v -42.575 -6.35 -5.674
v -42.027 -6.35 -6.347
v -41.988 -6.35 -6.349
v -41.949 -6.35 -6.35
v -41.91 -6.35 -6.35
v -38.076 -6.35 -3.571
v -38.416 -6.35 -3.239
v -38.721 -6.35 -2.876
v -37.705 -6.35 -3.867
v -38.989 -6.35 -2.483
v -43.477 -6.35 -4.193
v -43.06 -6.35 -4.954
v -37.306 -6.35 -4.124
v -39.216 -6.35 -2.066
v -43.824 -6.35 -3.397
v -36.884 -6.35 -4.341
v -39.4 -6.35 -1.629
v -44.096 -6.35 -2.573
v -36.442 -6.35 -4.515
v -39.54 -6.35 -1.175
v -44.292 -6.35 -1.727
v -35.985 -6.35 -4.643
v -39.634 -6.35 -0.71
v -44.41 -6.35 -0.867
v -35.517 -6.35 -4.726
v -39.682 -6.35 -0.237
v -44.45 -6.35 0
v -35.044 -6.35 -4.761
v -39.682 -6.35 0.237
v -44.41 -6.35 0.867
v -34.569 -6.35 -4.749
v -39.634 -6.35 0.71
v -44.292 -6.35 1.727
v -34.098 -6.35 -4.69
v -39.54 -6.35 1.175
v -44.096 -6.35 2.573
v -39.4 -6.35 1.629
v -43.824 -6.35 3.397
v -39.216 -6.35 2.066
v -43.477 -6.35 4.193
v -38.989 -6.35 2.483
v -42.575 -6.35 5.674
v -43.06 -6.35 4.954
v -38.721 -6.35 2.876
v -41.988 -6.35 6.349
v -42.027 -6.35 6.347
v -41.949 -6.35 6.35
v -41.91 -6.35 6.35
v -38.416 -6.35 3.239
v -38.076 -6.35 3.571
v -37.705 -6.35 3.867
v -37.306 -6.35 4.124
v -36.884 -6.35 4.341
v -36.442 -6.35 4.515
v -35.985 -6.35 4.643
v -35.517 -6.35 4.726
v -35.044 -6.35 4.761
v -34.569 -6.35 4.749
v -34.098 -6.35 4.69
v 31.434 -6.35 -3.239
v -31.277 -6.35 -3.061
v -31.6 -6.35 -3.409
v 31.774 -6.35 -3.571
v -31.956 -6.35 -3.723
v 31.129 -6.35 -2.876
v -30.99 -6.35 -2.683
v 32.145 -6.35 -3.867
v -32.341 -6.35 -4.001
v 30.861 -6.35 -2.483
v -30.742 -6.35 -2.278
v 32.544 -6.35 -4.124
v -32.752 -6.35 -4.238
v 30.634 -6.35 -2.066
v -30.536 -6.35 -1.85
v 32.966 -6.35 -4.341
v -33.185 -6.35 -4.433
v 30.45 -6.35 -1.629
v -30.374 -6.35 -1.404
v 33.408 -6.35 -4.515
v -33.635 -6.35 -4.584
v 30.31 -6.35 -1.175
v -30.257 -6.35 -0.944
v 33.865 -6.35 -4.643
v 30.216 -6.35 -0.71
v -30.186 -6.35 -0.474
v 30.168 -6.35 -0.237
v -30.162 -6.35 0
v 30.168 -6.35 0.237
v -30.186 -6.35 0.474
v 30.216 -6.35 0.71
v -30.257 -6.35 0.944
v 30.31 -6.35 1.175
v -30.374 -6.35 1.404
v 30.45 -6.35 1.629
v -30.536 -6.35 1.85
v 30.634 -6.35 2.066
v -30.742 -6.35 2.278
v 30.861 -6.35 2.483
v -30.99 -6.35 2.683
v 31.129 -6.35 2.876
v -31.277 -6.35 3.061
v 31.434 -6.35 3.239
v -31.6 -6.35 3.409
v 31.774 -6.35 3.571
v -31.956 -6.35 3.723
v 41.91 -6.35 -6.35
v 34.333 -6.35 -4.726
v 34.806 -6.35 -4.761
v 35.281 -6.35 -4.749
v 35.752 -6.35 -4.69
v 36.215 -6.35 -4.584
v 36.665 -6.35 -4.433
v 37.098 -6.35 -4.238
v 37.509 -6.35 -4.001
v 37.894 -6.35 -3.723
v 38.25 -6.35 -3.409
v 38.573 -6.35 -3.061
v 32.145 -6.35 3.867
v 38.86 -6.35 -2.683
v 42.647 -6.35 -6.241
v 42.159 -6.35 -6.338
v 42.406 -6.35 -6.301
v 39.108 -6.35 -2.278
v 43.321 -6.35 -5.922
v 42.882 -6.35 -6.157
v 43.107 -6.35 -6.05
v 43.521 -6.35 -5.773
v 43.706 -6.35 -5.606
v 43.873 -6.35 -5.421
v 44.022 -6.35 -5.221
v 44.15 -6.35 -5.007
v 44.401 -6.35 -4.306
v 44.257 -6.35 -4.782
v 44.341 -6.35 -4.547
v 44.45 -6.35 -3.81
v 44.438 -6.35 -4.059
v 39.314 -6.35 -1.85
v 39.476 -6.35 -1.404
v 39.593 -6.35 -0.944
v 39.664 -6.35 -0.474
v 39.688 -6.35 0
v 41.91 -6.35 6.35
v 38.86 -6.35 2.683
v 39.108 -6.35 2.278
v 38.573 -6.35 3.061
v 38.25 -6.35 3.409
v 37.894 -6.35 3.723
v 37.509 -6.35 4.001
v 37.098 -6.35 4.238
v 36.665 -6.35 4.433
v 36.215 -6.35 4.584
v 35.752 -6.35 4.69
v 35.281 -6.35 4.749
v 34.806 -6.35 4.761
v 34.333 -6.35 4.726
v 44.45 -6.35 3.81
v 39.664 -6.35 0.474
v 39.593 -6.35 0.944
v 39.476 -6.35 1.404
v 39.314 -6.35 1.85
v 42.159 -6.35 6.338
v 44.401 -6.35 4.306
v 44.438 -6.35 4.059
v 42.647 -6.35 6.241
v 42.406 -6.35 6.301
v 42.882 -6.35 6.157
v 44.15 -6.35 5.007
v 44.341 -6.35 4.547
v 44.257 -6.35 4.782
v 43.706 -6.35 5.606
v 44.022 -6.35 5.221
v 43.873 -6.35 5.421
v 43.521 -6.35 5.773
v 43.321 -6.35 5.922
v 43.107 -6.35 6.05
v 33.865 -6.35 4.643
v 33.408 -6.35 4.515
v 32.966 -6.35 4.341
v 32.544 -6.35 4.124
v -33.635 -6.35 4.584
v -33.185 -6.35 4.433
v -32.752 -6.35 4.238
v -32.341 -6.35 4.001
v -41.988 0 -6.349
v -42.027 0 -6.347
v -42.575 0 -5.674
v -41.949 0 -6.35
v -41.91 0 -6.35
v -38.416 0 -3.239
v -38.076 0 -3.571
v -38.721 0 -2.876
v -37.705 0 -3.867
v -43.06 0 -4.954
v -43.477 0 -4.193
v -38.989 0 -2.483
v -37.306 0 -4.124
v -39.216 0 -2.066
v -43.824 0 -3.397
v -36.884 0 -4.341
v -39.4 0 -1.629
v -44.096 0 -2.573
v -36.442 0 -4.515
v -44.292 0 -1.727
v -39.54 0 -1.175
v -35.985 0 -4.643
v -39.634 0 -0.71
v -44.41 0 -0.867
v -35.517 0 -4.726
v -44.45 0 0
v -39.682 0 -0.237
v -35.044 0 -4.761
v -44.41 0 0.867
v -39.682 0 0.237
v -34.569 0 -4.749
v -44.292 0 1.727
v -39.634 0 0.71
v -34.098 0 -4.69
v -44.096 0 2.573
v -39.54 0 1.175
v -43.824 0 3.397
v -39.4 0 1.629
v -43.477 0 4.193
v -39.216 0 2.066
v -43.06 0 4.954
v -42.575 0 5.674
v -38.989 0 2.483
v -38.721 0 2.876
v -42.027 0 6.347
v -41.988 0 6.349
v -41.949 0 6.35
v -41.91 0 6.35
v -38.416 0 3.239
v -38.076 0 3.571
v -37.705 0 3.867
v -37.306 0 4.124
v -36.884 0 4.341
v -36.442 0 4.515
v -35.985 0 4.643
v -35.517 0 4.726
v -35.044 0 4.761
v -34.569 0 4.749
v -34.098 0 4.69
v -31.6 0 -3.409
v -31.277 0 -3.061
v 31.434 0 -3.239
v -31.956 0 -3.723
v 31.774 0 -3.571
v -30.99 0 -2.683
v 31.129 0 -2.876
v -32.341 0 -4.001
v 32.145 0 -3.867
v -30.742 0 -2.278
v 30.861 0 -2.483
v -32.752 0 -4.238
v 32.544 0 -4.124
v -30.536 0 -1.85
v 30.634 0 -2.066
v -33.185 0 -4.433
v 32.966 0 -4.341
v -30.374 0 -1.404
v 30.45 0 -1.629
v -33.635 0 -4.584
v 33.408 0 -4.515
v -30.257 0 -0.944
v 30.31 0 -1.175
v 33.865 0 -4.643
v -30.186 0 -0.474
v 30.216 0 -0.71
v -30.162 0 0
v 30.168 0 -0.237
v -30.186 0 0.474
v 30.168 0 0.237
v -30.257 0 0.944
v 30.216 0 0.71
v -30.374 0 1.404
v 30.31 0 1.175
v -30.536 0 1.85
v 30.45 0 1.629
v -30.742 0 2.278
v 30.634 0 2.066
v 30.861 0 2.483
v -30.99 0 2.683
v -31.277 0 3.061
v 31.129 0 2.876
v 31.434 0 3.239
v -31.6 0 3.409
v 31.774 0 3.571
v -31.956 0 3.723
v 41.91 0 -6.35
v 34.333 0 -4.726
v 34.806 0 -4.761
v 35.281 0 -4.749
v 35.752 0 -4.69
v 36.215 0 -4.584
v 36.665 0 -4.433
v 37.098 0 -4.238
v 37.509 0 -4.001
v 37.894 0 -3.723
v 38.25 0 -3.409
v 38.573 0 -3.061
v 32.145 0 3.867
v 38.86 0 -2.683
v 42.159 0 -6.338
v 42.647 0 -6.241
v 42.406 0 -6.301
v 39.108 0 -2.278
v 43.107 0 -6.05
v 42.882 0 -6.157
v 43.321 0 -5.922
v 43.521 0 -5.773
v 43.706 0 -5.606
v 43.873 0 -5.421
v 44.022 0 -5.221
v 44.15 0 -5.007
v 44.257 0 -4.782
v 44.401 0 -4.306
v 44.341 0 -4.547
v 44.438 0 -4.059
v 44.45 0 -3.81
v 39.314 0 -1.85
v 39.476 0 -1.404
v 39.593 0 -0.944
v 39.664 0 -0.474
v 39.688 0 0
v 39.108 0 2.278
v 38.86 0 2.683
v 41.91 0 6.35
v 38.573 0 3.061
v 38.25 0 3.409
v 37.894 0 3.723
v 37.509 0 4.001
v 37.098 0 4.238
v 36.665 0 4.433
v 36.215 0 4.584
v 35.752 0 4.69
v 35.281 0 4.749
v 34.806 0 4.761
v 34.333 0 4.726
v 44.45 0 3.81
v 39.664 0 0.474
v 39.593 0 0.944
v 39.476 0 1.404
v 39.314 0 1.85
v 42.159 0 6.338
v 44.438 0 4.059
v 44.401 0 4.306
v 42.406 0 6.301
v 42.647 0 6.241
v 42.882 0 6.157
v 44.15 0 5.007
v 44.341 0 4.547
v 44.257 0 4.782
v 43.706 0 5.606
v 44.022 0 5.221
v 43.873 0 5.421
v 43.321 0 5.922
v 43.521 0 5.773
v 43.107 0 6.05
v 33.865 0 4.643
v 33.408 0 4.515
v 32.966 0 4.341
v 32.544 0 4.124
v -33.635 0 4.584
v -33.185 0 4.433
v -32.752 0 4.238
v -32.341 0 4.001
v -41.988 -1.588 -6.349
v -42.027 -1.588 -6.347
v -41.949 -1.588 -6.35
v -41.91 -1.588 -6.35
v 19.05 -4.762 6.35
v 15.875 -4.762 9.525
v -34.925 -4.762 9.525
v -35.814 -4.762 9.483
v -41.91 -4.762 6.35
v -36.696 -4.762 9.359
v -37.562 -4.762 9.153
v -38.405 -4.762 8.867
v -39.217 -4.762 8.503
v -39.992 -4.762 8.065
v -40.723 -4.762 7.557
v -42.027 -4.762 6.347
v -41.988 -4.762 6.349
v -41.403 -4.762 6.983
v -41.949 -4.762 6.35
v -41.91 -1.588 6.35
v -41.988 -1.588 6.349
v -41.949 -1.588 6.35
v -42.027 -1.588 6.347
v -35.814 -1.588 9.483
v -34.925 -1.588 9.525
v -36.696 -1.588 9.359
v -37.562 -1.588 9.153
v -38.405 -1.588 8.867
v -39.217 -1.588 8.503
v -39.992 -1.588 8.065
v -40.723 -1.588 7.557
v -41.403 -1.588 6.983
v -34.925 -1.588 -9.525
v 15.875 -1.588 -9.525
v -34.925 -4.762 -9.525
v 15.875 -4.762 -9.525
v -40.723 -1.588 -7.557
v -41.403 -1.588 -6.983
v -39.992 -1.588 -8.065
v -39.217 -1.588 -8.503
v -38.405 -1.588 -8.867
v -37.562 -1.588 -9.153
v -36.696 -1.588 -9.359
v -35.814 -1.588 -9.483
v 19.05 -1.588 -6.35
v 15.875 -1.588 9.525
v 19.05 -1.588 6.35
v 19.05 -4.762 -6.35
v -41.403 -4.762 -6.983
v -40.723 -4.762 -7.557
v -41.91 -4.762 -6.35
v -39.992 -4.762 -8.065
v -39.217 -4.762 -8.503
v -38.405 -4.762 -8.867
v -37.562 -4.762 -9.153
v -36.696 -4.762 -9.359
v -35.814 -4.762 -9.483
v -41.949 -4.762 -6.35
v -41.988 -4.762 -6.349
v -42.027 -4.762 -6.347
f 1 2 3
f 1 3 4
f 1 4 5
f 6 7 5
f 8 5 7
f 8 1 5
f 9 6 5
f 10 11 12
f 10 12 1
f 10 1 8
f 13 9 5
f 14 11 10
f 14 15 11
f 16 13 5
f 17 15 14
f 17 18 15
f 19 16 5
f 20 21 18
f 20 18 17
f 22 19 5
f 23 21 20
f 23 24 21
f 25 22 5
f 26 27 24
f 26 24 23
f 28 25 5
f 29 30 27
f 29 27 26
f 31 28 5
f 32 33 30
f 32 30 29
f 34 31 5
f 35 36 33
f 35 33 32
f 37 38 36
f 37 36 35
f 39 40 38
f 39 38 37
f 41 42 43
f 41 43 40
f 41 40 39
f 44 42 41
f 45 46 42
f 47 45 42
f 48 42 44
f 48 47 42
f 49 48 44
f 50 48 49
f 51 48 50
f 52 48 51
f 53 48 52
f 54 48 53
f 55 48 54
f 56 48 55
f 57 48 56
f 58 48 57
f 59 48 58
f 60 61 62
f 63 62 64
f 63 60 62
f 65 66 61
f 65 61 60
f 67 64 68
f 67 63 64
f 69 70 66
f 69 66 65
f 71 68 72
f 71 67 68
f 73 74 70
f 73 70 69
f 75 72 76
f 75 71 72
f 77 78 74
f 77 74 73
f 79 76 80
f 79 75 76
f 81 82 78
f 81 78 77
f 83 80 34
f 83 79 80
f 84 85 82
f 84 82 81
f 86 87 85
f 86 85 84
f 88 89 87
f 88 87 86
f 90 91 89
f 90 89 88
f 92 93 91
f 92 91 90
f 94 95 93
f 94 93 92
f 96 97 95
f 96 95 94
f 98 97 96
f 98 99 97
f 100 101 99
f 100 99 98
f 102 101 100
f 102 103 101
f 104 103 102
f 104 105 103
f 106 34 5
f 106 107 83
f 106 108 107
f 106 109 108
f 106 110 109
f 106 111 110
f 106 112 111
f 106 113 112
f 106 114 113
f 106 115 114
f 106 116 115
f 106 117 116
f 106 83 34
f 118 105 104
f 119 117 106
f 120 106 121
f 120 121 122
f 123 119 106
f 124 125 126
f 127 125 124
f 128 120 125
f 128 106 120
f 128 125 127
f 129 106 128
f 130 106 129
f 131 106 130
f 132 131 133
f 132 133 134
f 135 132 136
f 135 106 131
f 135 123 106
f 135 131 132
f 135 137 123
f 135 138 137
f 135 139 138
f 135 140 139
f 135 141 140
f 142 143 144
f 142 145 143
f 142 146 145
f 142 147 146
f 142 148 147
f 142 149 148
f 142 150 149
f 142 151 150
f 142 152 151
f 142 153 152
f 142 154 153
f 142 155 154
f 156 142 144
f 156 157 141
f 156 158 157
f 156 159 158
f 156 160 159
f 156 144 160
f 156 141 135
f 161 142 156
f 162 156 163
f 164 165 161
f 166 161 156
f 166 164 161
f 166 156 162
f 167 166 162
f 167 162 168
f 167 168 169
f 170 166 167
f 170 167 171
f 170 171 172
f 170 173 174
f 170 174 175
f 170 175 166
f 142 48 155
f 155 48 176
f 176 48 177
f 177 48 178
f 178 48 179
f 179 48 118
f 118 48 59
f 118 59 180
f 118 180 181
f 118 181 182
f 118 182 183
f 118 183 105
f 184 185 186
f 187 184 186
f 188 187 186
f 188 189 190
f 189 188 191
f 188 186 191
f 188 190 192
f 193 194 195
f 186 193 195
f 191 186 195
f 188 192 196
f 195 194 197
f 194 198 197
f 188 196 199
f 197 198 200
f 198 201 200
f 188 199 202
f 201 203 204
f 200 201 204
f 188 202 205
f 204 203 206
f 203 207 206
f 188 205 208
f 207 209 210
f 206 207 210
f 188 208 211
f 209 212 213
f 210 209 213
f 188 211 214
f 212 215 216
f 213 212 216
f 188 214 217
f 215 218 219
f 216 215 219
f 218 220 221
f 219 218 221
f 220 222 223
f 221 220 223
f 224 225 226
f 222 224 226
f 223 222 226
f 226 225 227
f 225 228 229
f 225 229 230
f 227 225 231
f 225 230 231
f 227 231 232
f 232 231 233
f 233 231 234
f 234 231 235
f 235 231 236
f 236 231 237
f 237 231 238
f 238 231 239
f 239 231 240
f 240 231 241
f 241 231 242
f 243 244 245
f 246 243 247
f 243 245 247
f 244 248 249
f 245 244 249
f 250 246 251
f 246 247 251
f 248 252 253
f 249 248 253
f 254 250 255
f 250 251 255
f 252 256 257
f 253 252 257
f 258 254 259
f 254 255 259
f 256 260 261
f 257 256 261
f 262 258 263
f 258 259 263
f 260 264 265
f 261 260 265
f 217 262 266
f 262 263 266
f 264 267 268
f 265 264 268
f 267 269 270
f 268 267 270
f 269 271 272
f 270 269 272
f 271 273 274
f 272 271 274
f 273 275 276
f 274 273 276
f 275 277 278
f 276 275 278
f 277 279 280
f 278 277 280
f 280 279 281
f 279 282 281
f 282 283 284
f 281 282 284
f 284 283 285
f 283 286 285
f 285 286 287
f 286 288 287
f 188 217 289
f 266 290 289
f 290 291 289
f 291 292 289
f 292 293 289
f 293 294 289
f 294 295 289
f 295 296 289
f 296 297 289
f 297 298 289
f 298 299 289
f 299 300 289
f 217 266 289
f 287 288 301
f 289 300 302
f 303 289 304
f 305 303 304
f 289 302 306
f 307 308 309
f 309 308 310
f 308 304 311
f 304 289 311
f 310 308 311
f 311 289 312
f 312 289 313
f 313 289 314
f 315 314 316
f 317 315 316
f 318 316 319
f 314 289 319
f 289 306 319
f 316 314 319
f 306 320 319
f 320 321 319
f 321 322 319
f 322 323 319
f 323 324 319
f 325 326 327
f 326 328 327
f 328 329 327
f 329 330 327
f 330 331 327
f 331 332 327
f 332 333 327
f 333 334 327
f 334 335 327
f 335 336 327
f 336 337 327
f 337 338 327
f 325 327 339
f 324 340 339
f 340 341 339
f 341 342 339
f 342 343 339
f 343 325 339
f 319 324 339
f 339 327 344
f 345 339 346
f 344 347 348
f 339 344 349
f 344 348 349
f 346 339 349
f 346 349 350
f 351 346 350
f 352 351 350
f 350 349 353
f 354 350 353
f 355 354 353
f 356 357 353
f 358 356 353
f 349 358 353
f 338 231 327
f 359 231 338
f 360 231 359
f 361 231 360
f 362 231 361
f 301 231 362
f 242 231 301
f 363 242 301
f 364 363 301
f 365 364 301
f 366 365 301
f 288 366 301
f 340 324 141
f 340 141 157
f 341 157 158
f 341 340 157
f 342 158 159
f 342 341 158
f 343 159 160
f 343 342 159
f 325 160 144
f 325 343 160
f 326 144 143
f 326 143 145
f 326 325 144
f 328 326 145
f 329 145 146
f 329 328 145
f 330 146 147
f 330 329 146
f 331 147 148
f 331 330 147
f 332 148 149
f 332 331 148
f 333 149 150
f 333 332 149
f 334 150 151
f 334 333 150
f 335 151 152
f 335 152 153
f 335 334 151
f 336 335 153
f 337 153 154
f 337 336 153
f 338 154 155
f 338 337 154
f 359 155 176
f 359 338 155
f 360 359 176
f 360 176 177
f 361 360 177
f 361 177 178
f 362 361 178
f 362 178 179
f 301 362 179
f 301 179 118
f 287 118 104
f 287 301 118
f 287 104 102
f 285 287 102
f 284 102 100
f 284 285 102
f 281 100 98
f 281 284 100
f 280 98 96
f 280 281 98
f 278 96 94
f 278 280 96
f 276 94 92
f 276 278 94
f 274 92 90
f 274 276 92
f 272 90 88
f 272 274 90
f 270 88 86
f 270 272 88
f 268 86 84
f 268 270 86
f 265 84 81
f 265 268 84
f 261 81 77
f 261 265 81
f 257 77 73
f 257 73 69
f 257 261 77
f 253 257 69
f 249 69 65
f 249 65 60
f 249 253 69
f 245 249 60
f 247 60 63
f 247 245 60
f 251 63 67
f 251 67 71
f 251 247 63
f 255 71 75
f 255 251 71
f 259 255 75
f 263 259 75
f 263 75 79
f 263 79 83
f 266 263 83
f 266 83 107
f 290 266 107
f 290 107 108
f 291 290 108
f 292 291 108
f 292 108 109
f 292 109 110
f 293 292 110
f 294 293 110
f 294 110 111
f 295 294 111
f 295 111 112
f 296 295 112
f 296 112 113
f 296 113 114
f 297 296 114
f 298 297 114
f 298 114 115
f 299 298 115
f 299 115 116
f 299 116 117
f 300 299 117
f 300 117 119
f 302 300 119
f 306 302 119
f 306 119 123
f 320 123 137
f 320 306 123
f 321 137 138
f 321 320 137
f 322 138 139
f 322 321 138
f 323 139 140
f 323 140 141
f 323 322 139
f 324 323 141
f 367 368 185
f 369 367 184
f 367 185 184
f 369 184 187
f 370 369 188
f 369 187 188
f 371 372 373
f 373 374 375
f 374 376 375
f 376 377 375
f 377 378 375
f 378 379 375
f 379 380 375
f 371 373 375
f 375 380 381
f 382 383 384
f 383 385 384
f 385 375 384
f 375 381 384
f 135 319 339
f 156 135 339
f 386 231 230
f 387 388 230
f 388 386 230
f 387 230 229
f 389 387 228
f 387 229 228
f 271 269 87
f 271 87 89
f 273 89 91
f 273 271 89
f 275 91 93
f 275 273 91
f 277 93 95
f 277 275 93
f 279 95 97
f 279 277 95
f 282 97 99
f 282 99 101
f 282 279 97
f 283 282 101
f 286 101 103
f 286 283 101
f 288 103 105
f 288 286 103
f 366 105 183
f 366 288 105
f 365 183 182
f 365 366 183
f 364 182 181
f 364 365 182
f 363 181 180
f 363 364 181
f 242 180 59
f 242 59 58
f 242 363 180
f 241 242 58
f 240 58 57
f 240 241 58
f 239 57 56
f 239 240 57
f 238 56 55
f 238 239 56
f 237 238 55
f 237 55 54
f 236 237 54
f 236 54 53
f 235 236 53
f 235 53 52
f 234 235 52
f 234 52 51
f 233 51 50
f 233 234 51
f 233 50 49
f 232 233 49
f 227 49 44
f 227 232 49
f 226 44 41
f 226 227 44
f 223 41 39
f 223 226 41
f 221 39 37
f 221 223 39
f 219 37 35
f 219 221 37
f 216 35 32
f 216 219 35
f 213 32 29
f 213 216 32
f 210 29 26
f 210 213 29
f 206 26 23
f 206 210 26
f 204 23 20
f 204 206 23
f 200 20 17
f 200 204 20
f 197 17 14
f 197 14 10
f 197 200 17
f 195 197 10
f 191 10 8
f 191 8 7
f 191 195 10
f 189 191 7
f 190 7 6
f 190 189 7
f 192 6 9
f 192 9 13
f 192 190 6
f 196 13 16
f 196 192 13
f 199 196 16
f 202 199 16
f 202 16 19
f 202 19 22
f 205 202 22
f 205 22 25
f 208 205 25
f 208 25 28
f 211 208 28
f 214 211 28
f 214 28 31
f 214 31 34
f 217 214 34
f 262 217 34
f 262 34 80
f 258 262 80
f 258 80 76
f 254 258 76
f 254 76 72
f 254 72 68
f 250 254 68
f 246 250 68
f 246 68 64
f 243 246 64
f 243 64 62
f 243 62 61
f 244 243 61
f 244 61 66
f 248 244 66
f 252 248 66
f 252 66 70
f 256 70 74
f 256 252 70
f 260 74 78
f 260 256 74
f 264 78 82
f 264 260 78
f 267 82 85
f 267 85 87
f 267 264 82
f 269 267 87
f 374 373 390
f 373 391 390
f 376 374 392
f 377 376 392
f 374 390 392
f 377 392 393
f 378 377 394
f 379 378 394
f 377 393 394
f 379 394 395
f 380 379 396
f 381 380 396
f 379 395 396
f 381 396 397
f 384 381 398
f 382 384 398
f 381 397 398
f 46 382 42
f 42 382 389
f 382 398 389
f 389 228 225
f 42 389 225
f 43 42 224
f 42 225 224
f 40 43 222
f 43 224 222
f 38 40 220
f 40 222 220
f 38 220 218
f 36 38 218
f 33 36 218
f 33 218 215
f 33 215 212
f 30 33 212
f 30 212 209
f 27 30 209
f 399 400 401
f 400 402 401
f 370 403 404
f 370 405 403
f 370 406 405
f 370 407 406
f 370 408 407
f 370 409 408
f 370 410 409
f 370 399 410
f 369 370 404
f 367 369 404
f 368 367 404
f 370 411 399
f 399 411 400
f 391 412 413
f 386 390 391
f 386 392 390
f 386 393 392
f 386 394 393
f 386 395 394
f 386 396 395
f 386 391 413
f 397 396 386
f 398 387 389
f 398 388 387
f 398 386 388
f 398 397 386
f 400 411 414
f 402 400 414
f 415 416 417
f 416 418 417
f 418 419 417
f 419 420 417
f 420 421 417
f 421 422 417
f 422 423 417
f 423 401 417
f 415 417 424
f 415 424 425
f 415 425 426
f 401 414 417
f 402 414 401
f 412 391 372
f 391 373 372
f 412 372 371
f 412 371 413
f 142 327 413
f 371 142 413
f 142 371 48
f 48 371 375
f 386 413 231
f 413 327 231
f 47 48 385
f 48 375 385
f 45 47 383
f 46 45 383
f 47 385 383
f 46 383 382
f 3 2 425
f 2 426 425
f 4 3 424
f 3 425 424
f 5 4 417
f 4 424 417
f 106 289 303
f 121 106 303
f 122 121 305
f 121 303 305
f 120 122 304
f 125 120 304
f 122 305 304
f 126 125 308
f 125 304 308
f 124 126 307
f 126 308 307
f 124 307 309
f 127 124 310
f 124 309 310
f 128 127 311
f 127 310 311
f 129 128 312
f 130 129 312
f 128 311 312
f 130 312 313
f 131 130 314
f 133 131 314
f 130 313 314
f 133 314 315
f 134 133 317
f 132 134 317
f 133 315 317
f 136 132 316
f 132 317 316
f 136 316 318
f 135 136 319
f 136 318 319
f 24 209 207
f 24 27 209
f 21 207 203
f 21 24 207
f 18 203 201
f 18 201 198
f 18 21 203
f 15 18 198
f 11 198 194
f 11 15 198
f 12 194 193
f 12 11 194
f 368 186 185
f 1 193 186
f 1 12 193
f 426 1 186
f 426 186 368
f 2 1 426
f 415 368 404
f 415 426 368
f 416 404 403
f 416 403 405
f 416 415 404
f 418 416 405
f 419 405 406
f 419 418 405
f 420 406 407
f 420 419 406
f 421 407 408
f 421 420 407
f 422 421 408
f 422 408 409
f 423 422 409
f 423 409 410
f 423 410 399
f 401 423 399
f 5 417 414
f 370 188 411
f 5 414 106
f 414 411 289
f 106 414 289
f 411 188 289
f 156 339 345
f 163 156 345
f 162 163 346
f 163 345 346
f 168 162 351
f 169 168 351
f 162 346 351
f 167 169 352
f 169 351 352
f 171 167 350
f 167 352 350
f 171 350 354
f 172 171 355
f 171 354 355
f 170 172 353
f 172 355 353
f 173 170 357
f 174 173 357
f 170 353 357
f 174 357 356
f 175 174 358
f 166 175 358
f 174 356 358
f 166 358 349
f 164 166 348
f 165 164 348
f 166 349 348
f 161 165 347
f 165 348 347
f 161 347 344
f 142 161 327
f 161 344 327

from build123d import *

# Parameters (mm, degrees)
F0_R          = 4.7625
F1_DEPTH      = 6.35
F5_DEPTH      = 1.5875
F5_DEPTH_BACK = 1.5875
F6_SIZE       = 3.17499
F7_R          = 9.52499


# Not quite as in the source:
# - a fillet or chamfer is up to 0.001 mm smaller than in the source, because OpenCascade refuses the exact size


with BuildPart() as f1:
    # F0 (on Front) → F1 (new body)
    with BuildSketch(Plane.XZ):
        with BuildLine():
            ThreePointArc((44.45, 3.81), (43.7060512242, 5.6060512242), (41.91, 6.35))
            Line((41.91, 6.35), (-41.91, 6.35))
            ThreePointArc((-41.91, 6.35), (-43.7060512242, 5.6060512242), (-44.45, 3.81))
            Line((-44.45, 3.81), (-44.45, -3.81))
            ThreePointArc((-44.45, -3.81), (-43.7060512242, -5.6060512242), (-41.91, -6.35))
            Line((-41.91, -6.35), (41.91, -6.35))
            ThreePointArc((41.91, -6.35), (43.7060512242, -5.6060512242), (44.45, -3.81))
            Line((44.45, -3.81), (44.45, 3.81))
        make_face()
        with Locations((-34.925, 0)):
            Circle(F0_R, mode=Mode.SUBTRACT)
        with Locations((34.925, 0)):
            Circle(F0_R, mode=Mode.SUBTRACT)
    extrude(amount=F1_DEPTH)

    # F4 (on face) → F5 (join, two sides)
    with BuildSketch(Plane(origin=(0, -3.175, 0), x_dir=(-1, 0, 0), z_dir=(0, 1, 0))) as f5_sk:
        Polygon((36.3781489432, 5.461), (44.45, 0), (44.45, 9.525), (-19.05, 9.525), (-19.05, 5.461), (29.7344345599, 5.461), align=None)
        Polygon((-19.05, -5.461), (-19.05, -9.525), (44.45, -9.525), (44.45, 0), (36.3781489432, -5.461), (29.7344345599, -5.461), align=None)
    extrude(amount=F5_DEPTH)
    extrude(f5_sk.sketch, amount=-F5_DEPTH_BACK)

    # F6 (size 3.175 in the source; OpenCascade refuses exactly that, so slightly less here)
    f6_edges = [f1.edges().sort_by_distance(p)[0] for p in [
        (19.05, -3.175, 9.525),
        (19.05, -3.175, -9.525),
    ]]
    chamfer(f6_edges, length=F6_SIZE)

    # F7 (radius 9.525 in the source; OpenCascade refuses exactly that, so slightly less here)
    f7_edges = [f1.edges().sort_by_distance(p)[0] for p in [
        (-44.45, -3.175, 9.525),
        (-44.45, -3.175, -9.525),
    ]]
    fillet(f7_edges, radius=F7_R)


solid = f1.part
